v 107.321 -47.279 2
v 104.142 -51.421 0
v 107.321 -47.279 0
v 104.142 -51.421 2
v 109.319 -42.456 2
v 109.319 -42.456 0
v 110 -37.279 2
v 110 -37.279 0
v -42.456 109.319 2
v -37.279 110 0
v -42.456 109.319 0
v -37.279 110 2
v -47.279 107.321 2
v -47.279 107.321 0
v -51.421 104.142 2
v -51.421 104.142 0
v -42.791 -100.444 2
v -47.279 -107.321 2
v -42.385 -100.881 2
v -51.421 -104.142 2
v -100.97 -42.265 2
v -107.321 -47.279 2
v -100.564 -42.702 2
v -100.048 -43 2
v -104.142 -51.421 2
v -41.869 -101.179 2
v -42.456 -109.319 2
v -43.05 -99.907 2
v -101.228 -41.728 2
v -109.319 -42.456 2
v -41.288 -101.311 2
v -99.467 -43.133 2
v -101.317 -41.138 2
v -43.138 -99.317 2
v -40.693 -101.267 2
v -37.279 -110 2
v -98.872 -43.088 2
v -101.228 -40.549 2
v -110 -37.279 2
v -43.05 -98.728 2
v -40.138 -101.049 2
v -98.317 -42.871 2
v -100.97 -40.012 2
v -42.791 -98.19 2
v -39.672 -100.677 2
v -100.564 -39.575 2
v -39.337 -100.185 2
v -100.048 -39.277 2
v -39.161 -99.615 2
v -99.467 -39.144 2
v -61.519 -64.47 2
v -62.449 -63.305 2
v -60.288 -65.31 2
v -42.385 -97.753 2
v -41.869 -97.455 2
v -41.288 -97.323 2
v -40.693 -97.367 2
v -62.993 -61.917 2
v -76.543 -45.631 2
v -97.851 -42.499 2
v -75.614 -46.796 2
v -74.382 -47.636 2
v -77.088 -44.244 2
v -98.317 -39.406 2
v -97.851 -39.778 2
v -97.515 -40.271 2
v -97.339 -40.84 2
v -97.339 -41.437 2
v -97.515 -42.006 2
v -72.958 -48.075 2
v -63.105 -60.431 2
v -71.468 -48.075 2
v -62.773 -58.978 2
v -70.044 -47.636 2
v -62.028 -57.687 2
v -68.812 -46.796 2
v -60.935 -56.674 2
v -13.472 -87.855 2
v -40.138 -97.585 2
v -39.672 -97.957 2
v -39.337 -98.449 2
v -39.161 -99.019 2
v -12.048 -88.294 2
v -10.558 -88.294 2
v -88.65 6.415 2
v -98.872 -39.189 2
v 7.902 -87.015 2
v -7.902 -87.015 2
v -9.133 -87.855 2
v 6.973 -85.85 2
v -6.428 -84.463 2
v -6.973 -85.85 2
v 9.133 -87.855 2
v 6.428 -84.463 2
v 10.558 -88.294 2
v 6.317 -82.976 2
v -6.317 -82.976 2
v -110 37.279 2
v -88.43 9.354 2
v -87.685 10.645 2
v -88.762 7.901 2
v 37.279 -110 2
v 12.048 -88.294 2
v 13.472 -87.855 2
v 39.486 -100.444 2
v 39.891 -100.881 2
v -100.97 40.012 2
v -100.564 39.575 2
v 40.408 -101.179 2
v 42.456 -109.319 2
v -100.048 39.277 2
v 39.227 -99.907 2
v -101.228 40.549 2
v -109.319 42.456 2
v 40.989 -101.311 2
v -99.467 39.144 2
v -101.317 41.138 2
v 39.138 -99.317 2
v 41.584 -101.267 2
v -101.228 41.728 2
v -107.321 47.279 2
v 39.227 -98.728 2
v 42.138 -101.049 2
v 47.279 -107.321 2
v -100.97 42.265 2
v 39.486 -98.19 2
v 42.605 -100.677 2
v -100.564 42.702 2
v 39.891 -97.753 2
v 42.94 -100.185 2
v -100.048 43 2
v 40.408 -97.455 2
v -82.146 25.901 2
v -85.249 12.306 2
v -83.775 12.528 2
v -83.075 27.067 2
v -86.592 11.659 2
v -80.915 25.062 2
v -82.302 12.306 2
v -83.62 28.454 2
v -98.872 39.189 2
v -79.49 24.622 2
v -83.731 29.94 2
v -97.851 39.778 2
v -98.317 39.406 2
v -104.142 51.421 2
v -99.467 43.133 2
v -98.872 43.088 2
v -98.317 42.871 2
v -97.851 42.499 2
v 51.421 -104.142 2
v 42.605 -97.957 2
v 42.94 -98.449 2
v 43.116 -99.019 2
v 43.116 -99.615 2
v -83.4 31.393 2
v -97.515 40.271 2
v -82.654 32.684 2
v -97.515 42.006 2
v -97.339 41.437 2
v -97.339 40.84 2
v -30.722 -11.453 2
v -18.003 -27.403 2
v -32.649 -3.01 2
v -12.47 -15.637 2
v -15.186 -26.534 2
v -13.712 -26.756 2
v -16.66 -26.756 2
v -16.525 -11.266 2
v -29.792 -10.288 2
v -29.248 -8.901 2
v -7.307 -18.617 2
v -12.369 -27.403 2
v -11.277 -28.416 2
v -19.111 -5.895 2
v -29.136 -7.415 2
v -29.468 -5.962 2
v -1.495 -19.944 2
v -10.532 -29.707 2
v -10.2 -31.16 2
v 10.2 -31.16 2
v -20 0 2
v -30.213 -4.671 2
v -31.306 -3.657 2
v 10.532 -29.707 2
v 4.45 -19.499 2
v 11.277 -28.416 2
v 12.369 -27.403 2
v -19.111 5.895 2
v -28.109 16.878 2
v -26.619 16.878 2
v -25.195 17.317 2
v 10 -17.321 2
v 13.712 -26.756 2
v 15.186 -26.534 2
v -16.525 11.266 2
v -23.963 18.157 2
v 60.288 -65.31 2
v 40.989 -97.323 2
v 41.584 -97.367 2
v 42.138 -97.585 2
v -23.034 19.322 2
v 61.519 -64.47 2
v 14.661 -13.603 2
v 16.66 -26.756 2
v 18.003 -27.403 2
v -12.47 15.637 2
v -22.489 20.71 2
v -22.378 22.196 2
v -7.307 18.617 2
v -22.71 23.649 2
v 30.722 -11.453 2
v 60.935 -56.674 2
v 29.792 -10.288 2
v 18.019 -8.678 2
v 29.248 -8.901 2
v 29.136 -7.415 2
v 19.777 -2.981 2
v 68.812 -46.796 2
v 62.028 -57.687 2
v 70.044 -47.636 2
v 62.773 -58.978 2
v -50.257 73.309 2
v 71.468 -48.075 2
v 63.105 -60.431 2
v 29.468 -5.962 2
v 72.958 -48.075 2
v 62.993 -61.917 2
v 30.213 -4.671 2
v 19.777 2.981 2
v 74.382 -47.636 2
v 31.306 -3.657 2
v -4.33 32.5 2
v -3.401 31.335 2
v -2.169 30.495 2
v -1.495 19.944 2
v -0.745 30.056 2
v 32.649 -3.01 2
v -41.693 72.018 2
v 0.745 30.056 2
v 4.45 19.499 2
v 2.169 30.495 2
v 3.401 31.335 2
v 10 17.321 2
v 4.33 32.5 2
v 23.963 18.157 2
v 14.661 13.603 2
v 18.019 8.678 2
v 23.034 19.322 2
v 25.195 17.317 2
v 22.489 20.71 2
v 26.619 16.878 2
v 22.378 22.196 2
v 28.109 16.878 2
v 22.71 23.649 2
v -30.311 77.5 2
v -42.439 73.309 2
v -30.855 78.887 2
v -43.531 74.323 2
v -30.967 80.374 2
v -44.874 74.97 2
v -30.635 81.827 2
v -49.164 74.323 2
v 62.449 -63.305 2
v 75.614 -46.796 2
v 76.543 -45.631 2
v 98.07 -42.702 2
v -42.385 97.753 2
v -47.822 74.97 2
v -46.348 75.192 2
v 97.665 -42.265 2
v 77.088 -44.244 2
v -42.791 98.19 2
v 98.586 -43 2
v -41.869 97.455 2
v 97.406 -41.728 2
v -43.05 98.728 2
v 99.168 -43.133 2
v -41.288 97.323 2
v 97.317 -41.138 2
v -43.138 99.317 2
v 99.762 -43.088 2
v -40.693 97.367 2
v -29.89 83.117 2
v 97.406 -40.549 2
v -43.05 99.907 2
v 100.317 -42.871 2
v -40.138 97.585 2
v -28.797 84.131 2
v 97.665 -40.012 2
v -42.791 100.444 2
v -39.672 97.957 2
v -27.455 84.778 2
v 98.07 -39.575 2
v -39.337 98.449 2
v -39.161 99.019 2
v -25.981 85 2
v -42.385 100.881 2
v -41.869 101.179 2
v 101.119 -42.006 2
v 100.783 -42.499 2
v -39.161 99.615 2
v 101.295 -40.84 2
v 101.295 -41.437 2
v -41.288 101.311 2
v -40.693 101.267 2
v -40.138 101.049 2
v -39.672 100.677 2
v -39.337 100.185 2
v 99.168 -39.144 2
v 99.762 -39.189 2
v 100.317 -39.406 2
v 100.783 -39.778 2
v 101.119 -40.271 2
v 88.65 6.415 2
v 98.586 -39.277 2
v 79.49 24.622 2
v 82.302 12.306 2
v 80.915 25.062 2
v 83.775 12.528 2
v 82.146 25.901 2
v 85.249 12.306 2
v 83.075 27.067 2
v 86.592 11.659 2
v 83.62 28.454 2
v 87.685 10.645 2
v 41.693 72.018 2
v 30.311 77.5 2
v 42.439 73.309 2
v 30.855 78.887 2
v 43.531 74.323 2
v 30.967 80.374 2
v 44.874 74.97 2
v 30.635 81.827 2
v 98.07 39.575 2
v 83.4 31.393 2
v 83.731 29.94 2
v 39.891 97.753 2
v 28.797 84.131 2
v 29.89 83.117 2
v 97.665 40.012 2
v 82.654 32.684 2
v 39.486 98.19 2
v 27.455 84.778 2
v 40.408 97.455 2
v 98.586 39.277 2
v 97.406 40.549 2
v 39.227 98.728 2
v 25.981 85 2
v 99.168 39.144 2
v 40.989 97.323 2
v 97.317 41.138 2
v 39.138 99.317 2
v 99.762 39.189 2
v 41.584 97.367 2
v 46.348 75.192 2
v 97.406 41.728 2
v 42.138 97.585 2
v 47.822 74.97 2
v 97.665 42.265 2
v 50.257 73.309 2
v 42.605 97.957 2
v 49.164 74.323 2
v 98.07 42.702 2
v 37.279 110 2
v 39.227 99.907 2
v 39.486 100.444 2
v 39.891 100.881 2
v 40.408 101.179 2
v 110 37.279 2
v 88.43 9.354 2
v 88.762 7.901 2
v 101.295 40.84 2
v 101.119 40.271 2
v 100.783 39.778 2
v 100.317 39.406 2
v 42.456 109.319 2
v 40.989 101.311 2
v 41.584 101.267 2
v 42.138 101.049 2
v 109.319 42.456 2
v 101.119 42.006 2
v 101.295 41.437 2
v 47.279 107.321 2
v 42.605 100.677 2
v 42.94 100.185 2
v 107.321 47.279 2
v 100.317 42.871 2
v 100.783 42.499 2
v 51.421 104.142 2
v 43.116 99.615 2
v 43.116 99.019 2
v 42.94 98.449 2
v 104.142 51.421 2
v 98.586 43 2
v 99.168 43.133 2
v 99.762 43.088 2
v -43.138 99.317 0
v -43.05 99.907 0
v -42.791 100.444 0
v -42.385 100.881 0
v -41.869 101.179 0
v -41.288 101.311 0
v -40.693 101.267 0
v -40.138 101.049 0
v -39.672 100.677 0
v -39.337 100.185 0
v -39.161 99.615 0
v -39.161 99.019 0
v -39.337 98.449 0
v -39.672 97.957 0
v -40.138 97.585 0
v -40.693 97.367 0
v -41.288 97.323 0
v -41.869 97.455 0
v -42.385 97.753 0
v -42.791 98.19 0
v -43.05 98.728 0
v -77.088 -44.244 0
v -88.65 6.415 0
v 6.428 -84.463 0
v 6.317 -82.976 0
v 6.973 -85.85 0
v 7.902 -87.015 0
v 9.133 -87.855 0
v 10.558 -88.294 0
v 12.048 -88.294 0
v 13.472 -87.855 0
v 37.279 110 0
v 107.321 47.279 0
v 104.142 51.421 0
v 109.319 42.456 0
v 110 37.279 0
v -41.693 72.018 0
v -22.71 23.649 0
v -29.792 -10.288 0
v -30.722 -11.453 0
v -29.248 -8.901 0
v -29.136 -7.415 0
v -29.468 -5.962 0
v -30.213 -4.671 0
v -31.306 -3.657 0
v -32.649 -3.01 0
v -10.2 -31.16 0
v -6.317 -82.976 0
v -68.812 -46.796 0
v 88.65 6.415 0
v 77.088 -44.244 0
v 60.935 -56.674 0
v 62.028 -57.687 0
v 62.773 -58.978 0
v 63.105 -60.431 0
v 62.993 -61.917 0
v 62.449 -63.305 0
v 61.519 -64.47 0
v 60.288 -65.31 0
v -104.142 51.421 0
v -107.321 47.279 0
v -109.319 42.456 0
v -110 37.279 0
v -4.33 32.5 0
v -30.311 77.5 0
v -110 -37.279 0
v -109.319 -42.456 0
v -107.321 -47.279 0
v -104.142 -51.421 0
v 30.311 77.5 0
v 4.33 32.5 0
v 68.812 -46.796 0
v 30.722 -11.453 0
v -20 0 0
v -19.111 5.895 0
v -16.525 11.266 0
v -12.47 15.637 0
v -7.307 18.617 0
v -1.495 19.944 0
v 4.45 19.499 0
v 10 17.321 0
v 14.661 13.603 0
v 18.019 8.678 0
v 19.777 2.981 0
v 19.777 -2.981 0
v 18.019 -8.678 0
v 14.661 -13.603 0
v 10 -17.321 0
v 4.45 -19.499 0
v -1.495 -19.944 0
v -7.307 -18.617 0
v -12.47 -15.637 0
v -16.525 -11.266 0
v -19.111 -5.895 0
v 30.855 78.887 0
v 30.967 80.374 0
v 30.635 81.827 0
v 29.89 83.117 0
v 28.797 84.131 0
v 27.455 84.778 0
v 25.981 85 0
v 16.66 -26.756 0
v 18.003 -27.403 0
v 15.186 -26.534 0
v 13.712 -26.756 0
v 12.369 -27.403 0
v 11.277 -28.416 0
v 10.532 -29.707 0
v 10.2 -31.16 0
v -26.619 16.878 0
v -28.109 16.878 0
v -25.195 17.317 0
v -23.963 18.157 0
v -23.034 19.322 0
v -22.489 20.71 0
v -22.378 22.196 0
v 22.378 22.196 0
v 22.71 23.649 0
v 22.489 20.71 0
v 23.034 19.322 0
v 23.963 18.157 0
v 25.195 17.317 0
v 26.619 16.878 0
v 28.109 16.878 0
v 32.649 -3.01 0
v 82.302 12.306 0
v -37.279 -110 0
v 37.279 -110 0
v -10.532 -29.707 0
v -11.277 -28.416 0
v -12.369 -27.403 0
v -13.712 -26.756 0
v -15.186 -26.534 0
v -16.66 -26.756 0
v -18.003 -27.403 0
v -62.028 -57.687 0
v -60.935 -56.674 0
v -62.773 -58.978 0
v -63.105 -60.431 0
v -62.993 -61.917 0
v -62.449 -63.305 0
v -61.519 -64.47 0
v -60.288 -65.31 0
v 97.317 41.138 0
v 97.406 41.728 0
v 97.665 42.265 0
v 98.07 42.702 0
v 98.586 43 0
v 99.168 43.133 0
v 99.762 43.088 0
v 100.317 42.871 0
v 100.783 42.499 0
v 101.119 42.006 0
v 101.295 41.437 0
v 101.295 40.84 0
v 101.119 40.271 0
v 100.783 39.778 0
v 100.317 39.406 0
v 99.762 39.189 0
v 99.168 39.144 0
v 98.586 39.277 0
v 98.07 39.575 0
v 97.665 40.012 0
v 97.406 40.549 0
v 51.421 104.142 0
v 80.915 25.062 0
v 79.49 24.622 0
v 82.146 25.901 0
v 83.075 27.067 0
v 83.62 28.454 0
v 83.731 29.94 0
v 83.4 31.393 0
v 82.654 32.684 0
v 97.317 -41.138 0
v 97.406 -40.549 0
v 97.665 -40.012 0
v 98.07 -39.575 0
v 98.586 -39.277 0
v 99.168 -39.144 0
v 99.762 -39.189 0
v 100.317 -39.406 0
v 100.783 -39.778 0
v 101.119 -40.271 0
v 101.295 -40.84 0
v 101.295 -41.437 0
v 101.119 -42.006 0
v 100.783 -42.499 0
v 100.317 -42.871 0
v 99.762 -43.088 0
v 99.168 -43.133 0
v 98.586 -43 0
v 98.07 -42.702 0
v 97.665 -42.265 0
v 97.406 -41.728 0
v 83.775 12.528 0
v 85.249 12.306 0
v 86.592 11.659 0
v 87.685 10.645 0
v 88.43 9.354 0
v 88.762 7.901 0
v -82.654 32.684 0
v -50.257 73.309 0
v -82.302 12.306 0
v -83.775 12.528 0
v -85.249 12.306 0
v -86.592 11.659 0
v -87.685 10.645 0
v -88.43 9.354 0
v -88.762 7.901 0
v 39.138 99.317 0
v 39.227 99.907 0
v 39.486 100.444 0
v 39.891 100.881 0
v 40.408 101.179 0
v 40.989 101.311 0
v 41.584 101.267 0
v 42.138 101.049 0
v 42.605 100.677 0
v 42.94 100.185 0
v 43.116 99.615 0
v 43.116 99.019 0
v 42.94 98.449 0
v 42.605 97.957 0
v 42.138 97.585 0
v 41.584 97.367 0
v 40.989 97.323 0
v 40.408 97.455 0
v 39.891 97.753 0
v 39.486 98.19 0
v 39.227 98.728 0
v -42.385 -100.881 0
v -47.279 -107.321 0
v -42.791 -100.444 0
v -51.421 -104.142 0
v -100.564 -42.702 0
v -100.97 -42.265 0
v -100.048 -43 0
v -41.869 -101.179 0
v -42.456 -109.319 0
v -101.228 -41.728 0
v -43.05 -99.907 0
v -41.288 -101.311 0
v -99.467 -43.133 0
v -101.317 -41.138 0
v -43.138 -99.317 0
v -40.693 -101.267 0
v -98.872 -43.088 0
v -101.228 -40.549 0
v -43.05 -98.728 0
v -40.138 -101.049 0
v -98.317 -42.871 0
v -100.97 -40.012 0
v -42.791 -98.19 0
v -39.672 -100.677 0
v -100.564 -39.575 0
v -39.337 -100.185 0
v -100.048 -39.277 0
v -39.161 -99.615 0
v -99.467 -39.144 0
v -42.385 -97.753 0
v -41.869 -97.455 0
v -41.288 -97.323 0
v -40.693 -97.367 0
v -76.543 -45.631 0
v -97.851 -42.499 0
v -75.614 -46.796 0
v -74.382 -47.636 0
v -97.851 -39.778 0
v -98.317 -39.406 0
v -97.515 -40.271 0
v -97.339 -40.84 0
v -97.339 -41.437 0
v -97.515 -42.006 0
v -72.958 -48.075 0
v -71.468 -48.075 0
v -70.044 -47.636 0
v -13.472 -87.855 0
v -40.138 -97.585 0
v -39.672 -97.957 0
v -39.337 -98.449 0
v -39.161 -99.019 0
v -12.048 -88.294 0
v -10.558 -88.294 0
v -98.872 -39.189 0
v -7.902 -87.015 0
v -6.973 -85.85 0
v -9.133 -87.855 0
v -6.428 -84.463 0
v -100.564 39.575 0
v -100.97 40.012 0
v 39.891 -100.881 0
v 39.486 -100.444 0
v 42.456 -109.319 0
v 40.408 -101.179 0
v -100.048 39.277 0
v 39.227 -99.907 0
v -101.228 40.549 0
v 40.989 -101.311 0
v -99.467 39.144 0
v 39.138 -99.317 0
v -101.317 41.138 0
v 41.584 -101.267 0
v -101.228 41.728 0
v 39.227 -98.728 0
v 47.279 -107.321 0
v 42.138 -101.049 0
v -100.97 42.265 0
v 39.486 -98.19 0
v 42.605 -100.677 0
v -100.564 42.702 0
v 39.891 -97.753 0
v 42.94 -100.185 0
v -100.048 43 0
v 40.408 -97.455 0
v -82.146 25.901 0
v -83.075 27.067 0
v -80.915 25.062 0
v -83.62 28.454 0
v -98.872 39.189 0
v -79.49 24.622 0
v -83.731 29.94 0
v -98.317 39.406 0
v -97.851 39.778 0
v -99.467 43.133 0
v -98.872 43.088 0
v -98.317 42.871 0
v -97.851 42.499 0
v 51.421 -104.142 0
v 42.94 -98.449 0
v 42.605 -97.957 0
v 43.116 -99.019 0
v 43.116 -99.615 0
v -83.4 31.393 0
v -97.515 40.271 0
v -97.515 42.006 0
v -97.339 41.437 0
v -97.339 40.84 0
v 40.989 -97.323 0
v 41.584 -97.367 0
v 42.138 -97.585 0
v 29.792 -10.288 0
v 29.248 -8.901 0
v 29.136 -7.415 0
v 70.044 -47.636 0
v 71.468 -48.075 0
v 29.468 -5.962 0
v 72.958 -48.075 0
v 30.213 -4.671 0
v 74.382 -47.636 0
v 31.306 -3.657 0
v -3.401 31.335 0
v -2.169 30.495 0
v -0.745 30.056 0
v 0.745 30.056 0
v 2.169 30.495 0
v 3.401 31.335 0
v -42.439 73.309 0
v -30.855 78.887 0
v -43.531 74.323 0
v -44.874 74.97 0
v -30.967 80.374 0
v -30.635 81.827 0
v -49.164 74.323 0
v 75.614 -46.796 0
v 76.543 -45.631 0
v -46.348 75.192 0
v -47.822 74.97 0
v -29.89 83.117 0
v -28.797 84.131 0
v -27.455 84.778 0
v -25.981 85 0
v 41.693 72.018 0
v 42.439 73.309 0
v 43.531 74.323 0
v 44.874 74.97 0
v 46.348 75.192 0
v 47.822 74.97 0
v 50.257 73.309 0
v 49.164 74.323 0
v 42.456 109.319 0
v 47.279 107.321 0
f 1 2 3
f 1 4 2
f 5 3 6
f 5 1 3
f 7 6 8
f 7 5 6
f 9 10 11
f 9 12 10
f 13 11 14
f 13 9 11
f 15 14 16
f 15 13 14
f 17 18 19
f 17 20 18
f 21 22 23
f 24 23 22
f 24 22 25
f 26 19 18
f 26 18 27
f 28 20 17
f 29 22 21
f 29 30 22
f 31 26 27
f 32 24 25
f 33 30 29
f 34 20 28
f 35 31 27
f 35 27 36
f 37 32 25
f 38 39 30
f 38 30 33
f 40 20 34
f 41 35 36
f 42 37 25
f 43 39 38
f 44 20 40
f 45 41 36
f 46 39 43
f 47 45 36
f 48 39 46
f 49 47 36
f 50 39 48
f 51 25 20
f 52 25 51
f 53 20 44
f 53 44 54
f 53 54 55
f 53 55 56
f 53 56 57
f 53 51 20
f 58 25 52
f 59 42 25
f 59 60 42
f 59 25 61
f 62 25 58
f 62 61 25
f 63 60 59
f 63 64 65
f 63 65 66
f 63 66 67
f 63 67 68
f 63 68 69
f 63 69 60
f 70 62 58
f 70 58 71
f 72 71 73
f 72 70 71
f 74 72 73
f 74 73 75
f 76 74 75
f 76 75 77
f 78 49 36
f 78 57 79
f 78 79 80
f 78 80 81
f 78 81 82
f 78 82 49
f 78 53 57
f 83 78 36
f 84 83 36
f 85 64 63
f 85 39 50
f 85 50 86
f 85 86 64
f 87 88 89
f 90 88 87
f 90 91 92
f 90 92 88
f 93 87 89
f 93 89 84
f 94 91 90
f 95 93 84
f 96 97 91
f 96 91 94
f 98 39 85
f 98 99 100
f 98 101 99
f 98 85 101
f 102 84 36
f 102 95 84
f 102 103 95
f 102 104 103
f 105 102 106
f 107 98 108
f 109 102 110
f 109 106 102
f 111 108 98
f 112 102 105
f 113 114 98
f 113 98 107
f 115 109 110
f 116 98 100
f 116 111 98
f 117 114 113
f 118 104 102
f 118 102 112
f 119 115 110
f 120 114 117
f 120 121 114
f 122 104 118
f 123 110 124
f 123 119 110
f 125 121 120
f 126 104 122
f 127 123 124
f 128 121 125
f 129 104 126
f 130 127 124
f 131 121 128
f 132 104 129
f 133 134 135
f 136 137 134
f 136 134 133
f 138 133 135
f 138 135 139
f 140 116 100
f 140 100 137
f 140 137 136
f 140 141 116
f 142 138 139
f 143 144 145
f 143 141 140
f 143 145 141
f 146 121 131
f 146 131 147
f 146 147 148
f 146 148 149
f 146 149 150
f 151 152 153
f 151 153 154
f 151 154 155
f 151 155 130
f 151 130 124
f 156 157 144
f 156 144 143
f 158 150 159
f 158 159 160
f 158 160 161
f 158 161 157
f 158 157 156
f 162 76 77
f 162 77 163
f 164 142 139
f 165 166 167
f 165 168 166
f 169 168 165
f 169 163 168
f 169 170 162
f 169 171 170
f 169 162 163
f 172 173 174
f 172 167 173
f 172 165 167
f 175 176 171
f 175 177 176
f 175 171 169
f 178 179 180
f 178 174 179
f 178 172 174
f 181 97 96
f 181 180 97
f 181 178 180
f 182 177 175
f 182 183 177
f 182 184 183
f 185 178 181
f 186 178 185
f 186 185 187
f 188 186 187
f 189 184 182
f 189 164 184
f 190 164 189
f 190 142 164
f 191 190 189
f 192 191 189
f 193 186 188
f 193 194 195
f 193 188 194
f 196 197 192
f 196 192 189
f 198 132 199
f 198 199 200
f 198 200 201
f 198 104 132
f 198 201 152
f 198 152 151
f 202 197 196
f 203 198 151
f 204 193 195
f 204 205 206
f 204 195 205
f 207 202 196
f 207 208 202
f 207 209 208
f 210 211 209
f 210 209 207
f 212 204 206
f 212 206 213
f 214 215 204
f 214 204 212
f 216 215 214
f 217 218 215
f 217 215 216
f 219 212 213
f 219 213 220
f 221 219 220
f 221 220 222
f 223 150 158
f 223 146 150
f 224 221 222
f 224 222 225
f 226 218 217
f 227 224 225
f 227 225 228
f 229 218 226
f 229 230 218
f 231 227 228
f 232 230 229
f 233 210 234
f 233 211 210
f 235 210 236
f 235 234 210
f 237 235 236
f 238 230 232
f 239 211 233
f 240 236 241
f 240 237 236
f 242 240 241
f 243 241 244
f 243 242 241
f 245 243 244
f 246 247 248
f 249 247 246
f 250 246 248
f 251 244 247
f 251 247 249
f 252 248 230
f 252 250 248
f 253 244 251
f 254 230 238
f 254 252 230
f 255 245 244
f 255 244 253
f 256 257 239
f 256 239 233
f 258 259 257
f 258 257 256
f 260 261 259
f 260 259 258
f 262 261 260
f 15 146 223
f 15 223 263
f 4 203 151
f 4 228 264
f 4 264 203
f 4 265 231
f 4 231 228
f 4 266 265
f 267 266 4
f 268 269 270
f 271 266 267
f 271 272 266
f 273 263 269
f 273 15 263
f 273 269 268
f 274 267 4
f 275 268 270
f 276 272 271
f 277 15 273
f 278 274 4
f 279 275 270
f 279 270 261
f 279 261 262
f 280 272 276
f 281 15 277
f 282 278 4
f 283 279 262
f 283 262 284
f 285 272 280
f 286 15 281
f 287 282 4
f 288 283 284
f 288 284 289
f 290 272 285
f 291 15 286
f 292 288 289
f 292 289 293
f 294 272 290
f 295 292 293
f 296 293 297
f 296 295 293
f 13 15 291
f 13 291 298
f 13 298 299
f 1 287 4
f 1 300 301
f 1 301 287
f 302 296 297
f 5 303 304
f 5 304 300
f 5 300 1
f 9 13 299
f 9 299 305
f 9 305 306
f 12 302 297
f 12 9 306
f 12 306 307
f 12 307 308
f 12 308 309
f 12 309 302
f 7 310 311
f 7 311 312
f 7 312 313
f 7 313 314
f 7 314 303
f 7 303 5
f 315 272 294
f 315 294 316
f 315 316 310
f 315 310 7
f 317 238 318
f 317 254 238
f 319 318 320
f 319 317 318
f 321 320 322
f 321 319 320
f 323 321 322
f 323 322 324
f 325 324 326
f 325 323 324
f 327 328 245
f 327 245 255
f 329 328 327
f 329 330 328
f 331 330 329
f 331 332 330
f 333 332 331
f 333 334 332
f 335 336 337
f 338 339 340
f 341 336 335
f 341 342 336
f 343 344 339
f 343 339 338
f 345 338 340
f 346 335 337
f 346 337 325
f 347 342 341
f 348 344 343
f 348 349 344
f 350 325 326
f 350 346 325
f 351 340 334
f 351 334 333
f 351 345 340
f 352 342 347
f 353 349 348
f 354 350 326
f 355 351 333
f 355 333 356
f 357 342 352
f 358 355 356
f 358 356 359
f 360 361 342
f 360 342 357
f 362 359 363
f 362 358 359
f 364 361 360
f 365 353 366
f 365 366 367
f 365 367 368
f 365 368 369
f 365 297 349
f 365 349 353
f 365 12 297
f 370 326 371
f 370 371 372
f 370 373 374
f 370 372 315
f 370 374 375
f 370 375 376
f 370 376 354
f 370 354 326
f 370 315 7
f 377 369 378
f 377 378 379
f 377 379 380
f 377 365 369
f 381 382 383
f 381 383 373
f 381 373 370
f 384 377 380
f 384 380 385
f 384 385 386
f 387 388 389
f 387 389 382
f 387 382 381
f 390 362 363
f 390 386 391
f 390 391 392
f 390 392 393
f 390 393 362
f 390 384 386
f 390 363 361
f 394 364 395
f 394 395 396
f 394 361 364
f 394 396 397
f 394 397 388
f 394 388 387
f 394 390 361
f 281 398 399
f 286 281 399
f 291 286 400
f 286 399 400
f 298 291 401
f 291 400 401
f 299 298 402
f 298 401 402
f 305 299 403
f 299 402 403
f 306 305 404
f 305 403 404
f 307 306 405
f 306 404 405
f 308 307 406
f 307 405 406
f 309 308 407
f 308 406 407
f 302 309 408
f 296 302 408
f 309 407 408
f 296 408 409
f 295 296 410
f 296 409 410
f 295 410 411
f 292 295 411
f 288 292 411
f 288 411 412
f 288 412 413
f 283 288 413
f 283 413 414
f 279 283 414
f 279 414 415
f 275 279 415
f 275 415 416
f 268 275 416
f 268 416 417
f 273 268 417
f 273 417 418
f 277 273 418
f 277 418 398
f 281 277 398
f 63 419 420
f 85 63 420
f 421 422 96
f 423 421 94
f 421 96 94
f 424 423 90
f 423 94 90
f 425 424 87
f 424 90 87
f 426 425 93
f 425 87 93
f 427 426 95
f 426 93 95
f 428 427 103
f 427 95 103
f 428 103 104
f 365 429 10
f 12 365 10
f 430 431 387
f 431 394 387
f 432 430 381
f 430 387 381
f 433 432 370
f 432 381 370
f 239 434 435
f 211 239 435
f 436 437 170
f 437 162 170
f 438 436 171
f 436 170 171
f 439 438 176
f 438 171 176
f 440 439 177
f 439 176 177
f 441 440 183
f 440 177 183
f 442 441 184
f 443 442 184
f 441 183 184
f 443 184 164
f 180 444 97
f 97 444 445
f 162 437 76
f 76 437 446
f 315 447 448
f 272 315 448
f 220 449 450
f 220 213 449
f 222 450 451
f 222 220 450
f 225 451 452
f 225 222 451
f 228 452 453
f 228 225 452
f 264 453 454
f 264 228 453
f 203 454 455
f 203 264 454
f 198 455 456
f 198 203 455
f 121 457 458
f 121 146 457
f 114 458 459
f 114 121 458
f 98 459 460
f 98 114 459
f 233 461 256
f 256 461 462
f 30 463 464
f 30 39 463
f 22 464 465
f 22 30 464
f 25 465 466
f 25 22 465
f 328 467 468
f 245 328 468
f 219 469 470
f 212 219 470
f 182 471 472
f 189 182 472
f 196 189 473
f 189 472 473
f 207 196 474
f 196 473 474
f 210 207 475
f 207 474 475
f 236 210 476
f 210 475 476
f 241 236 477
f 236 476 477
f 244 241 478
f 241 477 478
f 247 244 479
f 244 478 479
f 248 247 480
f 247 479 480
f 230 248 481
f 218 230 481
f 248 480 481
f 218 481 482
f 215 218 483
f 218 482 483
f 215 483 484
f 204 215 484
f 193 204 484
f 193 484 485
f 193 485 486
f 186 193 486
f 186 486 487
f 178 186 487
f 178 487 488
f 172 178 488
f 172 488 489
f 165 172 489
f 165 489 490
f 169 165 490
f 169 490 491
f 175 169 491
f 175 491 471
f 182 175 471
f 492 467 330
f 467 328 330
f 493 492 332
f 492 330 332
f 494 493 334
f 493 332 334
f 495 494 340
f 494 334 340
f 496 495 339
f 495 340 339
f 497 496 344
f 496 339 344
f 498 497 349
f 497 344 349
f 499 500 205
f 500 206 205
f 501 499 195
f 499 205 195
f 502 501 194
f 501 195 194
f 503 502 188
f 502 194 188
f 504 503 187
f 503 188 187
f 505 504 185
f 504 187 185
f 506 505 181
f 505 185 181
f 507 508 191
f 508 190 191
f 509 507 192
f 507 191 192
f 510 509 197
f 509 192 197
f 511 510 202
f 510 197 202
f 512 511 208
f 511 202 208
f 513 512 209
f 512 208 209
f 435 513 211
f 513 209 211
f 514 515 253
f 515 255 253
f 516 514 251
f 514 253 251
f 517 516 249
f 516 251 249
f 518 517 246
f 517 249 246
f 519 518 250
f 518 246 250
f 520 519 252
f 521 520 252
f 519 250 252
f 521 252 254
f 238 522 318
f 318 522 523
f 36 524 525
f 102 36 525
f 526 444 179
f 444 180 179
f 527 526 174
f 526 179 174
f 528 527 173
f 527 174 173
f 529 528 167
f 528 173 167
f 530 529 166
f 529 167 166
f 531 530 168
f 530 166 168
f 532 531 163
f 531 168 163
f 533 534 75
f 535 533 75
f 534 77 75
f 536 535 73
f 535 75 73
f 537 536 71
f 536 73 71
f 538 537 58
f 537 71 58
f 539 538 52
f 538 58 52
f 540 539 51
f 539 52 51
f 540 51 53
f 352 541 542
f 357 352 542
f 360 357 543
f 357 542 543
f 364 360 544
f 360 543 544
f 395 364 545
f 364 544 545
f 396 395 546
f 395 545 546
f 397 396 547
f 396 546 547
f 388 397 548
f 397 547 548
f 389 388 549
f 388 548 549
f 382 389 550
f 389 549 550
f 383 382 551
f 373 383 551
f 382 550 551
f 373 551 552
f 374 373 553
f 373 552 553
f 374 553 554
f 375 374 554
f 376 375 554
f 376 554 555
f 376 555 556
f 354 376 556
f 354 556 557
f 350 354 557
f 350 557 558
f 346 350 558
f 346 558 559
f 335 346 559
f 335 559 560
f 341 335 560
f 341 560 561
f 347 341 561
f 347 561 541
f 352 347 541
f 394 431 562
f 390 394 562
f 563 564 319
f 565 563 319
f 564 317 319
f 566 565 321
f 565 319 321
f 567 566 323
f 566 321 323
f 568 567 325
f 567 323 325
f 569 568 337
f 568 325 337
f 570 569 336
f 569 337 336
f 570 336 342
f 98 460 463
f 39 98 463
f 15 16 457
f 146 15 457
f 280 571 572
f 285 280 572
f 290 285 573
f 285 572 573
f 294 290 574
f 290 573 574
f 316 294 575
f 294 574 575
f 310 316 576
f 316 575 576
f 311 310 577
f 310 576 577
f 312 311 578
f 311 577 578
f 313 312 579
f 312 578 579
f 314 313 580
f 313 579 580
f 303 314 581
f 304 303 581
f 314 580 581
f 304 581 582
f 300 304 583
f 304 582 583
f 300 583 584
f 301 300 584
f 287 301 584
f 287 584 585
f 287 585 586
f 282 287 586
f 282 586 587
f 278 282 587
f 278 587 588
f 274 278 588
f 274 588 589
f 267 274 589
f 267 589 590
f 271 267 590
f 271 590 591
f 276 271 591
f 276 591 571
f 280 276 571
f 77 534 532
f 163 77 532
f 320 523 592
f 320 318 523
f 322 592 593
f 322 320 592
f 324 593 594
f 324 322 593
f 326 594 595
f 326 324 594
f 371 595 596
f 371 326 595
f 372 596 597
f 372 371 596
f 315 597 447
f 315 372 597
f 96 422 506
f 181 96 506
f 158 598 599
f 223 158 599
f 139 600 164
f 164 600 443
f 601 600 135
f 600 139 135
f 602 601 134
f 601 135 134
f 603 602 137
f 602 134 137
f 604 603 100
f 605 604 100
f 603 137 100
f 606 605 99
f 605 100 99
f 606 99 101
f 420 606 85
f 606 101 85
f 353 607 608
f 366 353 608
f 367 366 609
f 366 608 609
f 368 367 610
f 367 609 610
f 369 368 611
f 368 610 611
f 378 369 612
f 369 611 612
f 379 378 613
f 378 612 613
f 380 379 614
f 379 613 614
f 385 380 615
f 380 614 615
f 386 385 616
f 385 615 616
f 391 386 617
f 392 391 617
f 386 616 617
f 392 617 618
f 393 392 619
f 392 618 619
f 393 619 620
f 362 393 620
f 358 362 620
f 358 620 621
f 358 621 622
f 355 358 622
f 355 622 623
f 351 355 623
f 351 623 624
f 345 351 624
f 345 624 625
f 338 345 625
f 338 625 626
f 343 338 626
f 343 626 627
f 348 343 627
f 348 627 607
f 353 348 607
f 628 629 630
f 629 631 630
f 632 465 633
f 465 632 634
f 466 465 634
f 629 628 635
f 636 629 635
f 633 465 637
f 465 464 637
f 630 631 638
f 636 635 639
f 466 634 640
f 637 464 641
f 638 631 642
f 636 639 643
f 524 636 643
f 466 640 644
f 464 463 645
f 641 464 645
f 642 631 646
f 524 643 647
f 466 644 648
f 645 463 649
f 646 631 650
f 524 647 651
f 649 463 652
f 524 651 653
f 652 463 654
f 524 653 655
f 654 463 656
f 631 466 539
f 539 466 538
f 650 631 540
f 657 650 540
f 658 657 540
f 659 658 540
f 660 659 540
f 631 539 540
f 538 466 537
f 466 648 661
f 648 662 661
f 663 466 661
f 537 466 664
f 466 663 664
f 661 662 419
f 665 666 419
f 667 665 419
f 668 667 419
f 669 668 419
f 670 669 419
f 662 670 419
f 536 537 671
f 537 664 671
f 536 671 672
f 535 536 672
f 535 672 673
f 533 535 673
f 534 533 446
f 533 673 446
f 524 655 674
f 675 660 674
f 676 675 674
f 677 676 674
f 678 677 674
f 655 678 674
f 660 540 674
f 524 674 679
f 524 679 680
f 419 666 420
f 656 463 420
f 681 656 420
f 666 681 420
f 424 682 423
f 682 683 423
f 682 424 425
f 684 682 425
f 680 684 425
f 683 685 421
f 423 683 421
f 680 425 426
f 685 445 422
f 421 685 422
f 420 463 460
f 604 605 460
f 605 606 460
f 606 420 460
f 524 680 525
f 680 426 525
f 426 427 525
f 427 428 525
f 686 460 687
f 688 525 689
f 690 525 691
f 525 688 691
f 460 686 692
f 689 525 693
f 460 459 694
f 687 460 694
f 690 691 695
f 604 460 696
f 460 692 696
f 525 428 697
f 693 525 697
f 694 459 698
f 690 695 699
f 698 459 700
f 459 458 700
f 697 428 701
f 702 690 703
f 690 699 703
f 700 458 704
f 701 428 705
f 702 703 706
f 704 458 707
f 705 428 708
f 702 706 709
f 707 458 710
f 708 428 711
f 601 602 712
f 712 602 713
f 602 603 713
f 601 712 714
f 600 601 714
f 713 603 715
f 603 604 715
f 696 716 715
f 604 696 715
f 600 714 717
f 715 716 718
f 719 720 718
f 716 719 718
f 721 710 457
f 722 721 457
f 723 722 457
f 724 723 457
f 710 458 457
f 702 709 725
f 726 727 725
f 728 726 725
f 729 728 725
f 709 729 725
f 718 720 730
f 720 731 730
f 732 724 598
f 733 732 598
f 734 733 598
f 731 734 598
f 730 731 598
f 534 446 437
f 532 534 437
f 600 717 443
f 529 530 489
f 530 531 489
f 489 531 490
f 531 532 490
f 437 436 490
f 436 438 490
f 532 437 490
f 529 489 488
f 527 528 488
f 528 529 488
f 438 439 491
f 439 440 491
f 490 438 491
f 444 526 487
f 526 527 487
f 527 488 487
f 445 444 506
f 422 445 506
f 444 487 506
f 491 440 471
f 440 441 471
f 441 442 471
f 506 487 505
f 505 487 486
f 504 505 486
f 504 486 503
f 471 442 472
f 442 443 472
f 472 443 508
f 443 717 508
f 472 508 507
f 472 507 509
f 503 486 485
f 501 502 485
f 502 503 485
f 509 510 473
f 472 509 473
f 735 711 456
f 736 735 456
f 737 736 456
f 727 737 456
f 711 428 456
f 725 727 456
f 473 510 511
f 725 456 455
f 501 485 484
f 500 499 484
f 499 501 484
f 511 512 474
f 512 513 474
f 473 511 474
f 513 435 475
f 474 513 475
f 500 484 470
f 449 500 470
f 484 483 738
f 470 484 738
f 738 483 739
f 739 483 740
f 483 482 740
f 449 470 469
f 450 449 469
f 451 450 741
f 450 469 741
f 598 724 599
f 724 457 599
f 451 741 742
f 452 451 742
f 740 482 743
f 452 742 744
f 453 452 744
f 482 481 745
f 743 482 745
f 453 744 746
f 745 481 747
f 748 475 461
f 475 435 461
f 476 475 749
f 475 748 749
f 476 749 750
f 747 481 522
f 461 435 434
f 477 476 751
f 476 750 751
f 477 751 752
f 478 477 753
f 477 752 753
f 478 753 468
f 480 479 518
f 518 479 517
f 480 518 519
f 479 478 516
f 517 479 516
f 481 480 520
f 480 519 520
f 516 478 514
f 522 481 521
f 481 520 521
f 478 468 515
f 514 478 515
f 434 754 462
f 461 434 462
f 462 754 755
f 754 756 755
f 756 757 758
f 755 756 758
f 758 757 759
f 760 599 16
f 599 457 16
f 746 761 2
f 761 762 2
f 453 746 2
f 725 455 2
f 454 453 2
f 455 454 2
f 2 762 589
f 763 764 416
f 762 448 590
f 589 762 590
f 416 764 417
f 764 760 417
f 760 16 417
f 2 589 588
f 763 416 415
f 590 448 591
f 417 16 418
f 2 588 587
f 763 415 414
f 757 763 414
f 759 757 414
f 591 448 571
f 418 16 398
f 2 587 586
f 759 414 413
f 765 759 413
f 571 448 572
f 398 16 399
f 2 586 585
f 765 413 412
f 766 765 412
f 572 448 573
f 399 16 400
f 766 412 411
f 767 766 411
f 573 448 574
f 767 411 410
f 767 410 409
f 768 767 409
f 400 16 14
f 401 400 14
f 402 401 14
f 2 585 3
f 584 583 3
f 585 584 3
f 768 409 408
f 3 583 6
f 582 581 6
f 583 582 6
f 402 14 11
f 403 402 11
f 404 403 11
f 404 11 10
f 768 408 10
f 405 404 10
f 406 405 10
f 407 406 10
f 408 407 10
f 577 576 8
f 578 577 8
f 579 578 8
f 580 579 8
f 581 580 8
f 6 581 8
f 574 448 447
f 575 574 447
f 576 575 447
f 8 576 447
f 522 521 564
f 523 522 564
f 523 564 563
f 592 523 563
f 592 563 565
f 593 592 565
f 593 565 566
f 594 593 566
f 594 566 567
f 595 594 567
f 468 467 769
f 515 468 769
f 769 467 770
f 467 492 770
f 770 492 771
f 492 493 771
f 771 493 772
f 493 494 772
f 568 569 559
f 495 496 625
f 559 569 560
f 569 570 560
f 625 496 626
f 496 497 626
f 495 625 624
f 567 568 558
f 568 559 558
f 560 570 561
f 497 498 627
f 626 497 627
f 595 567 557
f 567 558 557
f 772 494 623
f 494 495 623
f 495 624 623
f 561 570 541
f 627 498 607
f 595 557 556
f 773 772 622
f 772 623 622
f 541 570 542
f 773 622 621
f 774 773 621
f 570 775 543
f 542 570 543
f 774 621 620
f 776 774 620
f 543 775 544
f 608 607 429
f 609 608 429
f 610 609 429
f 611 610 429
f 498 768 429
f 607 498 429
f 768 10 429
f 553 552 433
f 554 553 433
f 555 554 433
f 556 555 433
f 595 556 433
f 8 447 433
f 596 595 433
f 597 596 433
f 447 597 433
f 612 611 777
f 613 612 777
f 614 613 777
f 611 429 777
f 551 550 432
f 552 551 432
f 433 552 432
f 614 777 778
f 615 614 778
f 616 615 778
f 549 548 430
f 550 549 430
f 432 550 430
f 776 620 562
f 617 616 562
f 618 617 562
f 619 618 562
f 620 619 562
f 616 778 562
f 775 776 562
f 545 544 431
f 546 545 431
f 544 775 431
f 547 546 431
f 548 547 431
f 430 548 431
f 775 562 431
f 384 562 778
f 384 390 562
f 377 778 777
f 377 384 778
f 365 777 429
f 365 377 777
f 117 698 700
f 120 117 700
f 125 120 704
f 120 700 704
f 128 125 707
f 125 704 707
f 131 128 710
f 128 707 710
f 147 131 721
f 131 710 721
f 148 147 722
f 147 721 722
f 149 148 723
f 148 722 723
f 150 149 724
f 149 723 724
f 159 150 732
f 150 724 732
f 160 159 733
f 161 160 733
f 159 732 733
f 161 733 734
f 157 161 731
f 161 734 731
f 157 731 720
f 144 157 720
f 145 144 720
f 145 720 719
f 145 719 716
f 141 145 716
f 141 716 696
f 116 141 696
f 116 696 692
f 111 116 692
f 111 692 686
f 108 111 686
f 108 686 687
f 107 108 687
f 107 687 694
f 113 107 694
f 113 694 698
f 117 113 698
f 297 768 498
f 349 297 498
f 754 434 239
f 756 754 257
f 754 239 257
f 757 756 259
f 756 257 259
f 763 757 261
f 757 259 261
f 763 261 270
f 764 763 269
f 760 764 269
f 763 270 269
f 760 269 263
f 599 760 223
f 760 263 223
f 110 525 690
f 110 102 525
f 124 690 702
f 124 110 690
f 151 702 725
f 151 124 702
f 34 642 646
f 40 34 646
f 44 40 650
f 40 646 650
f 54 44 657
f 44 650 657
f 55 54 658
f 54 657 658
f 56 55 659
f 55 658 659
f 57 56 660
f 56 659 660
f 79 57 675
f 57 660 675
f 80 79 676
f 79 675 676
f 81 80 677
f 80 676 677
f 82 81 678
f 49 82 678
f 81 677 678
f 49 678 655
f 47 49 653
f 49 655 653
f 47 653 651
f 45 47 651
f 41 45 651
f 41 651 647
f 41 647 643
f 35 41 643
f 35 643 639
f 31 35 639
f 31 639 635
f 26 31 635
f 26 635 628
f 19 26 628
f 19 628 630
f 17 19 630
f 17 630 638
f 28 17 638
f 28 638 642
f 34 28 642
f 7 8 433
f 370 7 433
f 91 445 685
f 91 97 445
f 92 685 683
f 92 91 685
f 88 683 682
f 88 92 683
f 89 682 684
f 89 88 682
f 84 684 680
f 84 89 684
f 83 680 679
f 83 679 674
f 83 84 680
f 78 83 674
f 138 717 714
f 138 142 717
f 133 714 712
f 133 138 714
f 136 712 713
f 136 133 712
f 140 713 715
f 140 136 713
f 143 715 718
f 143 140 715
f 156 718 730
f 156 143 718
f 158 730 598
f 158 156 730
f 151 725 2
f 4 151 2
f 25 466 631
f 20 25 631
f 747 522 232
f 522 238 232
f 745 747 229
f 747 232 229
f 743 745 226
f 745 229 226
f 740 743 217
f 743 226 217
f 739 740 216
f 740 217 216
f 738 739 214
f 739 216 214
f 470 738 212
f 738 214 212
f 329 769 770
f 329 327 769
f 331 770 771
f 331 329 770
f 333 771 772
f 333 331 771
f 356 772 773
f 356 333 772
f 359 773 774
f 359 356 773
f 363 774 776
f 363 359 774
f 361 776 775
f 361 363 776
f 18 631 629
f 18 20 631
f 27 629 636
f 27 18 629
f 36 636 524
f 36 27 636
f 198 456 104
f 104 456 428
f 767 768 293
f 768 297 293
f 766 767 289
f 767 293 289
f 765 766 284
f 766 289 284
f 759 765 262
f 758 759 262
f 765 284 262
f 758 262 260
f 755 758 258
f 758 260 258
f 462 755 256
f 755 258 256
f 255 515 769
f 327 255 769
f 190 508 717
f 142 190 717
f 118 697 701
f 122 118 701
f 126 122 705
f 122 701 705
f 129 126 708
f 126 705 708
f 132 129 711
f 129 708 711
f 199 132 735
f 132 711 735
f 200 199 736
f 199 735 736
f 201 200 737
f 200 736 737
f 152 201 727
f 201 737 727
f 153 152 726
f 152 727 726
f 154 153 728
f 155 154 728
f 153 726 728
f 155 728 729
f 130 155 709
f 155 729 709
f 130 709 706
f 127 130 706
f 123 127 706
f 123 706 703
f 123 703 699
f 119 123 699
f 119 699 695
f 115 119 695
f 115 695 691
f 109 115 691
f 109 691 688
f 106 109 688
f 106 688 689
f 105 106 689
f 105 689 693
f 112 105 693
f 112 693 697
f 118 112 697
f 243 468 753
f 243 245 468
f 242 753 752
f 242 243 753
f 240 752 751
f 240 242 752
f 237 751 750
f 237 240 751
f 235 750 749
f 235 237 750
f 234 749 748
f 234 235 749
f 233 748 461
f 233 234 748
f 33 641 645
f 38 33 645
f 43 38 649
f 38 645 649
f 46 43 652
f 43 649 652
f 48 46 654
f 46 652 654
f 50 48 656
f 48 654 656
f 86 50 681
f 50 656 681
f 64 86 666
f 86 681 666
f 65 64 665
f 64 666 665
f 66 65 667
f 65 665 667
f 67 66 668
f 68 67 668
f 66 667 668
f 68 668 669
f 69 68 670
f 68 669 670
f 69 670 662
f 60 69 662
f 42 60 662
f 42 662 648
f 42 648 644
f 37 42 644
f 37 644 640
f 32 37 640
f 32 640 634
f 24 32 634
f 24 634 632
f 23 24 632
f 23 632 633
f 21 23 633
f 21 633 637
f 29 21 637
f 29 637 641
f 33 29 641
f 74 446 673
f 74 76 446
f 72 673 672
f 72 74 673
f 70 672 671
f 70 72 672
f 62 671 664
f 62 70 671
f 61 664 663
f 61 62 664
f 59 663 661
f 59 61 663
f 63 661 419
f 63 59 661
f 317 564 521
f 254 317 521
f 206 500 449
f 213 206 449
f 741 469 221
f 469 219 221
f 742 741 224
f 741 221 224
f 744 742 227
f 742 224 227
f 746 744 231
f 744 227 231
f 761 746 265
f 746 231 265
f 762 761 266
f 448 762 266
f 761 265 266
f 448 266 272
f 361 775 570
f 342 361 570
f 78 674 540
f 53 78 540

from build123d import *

# Parameters (mm, degrees)
EXTRUDE_1_DEPTH     = 2
FILLET_1_R          = 20
SKETCH_3_R          = 2
CUT_EXTRUDE_2_DEPTH = 10
SKETCH_4_R          = 20
CUT_EXTRUDE_3_DEPTH = 10
FILLET_2_R          = 5


with BuildPart() as part:
    # 草图1 → 凸台-拉伸1 (new body)
    with BuildSketch(Plane.XY):
        Polygon((110, 45.563491861), (45.563491861, 110), (-45.563491861, 110), (-110, 45.563491861), (-110, -45.563491861), (-45.563491861, -110), (45.563491861, -110), (110, -45.563491861), align=None)
    extrude(amount=EXTRUDE_1_DEPTH)

    # 圆角1
    fillet_1_edges = [part.edges().sort_by_distance(p)[0] for p in [
        (110, -45.563491861, 1),
        (45.563491861, -110, 1),
        (-45.563491861, -110, 1),
        (-110, -45.563491861, 1),
        (-110, 45.563491861, 1),
        (-45.563491861, 110, 1),
        (45.563491861, 110, 1),
        (110, 45.563491861, 1),
    ]]
    fillet(fillet_1_edges, radius=FILLET_1_R)

    # 草图3 → 切除-拉伸2 (cut)
    with BuildSketch(Plane(origin=(0, 0, 0), x_dir=(-1, 0, 0), z_dir=(0, 0, -1))):
        with Locations((-99.317049745, 41.138468979)):
            Circle(SKETCH_3_R)
        with Locations((-41.138468979, 99.317049745)):
            Circle(SKETCH_3_R)
        with Locations((41.138468979, 99.317049745)):
            Circle(SKETCH_3_R)
        with Locations((99.317049745, 41.138468979)):
            Circle(SKETCH_3_R)
        with Locations((99.317049745, -41.138468979)):
            Circle(SKETCH_3_R)
        with Locations((41.138468979, -99.317049745)):
            Circle(SKETCH_3_R)
        with Locations((-41.138468979, -99.317049745)):
            Circle(SKETCH_3_R)
        with Locations((-99.317049745, -41.138468979)):
            Circle(SKETCH_3_R)
    extrude(amount=-CUT_EXTRUDE_2_DEPTH, mode=Mode.SUBTRACT)

    # 草图4 → 切除-拉伸3 (cut)
    with BuildSketch(Plane(origin=(0, 0, 0), x_dir=(-1, 0, 0), z_dir=(0, 0, -1))):
        Circle(SKETCH_4_R)
        Polygon((88.053996306, 25.913196146), (44.857355713, 80.08007017), (19.545787062, 15.587245046), align=None)
        Polygon((0, 25), (34.641016151, 85), (-34.641016151, 85), align=None)
        Polygon((75.160521268, -52.686772939), (90.577223803, 14.858214166), (24.373197805, -5.563023349), align=None)
        Polygon((5.66964072, -91.612527386), (68.09059493, -61.552180157), (10.847093478, -22.524221698), align=None)
        Polygon((-68.09059493, -61.552180157), (-5.66964072, -91.612527386), (-10.847093478, -22.524221698), align=None)
        Polygon((-90.577223803, 14.858214166), (-75.160521268, -52.686772939), (-24.373197805, -5.563023349), align=None)
        Polygon((-44.857355713, 80.08007017), (-88.053996306, 25.913196146), (-19.545787062, 15.587245046), align=None)
    extrude(amount=-CUT_EXTRUDE_3_DEPTH, mode=Mode.SUBTRACT)

    # 圆角2
    fillet_2_edges = [part.edges().sort_by_distance(p)[0] for p in [
        (0, 25, 1),
        (34.641016151, 85, 1),
        (-34.641016151, 85, 1),
        (-5.66964072, -91.612527386, 1),
        (-10.847093478, -22.524221698, 1),
        (-68.09059493, -61.552180157, 1),
        (68.09059493, -61.552180157, 1),
        (10.847093478, -22.524221698, 1),
        (5.66964072, -91.612527386, 1),
        (90.577223803, 14.858214166, 1),
        (24.373197805, -5.563023349, 1),
        (75.160521268, -52.686772939, 1),
        (44.857355713, 80.08007017, 1),
        (19.545787062, 15.587245046, 1),
        (88.053996306, 25.913196146, 1),
        (-88.053996306, 25.913196146, 1),
        (-19.545787062, 15.587245046, 1),
        (-44.857355713, 80.08007017, 1),
        (-75.160521268, -52.686772939, 1),
        (-24.373197805, -5.563023349, 1),
        (-90.577223803, 14.858214166, 1),
    ]]
    fillet(fillet_2_edges, radius=FILLET_2_R)


solid = part.part
